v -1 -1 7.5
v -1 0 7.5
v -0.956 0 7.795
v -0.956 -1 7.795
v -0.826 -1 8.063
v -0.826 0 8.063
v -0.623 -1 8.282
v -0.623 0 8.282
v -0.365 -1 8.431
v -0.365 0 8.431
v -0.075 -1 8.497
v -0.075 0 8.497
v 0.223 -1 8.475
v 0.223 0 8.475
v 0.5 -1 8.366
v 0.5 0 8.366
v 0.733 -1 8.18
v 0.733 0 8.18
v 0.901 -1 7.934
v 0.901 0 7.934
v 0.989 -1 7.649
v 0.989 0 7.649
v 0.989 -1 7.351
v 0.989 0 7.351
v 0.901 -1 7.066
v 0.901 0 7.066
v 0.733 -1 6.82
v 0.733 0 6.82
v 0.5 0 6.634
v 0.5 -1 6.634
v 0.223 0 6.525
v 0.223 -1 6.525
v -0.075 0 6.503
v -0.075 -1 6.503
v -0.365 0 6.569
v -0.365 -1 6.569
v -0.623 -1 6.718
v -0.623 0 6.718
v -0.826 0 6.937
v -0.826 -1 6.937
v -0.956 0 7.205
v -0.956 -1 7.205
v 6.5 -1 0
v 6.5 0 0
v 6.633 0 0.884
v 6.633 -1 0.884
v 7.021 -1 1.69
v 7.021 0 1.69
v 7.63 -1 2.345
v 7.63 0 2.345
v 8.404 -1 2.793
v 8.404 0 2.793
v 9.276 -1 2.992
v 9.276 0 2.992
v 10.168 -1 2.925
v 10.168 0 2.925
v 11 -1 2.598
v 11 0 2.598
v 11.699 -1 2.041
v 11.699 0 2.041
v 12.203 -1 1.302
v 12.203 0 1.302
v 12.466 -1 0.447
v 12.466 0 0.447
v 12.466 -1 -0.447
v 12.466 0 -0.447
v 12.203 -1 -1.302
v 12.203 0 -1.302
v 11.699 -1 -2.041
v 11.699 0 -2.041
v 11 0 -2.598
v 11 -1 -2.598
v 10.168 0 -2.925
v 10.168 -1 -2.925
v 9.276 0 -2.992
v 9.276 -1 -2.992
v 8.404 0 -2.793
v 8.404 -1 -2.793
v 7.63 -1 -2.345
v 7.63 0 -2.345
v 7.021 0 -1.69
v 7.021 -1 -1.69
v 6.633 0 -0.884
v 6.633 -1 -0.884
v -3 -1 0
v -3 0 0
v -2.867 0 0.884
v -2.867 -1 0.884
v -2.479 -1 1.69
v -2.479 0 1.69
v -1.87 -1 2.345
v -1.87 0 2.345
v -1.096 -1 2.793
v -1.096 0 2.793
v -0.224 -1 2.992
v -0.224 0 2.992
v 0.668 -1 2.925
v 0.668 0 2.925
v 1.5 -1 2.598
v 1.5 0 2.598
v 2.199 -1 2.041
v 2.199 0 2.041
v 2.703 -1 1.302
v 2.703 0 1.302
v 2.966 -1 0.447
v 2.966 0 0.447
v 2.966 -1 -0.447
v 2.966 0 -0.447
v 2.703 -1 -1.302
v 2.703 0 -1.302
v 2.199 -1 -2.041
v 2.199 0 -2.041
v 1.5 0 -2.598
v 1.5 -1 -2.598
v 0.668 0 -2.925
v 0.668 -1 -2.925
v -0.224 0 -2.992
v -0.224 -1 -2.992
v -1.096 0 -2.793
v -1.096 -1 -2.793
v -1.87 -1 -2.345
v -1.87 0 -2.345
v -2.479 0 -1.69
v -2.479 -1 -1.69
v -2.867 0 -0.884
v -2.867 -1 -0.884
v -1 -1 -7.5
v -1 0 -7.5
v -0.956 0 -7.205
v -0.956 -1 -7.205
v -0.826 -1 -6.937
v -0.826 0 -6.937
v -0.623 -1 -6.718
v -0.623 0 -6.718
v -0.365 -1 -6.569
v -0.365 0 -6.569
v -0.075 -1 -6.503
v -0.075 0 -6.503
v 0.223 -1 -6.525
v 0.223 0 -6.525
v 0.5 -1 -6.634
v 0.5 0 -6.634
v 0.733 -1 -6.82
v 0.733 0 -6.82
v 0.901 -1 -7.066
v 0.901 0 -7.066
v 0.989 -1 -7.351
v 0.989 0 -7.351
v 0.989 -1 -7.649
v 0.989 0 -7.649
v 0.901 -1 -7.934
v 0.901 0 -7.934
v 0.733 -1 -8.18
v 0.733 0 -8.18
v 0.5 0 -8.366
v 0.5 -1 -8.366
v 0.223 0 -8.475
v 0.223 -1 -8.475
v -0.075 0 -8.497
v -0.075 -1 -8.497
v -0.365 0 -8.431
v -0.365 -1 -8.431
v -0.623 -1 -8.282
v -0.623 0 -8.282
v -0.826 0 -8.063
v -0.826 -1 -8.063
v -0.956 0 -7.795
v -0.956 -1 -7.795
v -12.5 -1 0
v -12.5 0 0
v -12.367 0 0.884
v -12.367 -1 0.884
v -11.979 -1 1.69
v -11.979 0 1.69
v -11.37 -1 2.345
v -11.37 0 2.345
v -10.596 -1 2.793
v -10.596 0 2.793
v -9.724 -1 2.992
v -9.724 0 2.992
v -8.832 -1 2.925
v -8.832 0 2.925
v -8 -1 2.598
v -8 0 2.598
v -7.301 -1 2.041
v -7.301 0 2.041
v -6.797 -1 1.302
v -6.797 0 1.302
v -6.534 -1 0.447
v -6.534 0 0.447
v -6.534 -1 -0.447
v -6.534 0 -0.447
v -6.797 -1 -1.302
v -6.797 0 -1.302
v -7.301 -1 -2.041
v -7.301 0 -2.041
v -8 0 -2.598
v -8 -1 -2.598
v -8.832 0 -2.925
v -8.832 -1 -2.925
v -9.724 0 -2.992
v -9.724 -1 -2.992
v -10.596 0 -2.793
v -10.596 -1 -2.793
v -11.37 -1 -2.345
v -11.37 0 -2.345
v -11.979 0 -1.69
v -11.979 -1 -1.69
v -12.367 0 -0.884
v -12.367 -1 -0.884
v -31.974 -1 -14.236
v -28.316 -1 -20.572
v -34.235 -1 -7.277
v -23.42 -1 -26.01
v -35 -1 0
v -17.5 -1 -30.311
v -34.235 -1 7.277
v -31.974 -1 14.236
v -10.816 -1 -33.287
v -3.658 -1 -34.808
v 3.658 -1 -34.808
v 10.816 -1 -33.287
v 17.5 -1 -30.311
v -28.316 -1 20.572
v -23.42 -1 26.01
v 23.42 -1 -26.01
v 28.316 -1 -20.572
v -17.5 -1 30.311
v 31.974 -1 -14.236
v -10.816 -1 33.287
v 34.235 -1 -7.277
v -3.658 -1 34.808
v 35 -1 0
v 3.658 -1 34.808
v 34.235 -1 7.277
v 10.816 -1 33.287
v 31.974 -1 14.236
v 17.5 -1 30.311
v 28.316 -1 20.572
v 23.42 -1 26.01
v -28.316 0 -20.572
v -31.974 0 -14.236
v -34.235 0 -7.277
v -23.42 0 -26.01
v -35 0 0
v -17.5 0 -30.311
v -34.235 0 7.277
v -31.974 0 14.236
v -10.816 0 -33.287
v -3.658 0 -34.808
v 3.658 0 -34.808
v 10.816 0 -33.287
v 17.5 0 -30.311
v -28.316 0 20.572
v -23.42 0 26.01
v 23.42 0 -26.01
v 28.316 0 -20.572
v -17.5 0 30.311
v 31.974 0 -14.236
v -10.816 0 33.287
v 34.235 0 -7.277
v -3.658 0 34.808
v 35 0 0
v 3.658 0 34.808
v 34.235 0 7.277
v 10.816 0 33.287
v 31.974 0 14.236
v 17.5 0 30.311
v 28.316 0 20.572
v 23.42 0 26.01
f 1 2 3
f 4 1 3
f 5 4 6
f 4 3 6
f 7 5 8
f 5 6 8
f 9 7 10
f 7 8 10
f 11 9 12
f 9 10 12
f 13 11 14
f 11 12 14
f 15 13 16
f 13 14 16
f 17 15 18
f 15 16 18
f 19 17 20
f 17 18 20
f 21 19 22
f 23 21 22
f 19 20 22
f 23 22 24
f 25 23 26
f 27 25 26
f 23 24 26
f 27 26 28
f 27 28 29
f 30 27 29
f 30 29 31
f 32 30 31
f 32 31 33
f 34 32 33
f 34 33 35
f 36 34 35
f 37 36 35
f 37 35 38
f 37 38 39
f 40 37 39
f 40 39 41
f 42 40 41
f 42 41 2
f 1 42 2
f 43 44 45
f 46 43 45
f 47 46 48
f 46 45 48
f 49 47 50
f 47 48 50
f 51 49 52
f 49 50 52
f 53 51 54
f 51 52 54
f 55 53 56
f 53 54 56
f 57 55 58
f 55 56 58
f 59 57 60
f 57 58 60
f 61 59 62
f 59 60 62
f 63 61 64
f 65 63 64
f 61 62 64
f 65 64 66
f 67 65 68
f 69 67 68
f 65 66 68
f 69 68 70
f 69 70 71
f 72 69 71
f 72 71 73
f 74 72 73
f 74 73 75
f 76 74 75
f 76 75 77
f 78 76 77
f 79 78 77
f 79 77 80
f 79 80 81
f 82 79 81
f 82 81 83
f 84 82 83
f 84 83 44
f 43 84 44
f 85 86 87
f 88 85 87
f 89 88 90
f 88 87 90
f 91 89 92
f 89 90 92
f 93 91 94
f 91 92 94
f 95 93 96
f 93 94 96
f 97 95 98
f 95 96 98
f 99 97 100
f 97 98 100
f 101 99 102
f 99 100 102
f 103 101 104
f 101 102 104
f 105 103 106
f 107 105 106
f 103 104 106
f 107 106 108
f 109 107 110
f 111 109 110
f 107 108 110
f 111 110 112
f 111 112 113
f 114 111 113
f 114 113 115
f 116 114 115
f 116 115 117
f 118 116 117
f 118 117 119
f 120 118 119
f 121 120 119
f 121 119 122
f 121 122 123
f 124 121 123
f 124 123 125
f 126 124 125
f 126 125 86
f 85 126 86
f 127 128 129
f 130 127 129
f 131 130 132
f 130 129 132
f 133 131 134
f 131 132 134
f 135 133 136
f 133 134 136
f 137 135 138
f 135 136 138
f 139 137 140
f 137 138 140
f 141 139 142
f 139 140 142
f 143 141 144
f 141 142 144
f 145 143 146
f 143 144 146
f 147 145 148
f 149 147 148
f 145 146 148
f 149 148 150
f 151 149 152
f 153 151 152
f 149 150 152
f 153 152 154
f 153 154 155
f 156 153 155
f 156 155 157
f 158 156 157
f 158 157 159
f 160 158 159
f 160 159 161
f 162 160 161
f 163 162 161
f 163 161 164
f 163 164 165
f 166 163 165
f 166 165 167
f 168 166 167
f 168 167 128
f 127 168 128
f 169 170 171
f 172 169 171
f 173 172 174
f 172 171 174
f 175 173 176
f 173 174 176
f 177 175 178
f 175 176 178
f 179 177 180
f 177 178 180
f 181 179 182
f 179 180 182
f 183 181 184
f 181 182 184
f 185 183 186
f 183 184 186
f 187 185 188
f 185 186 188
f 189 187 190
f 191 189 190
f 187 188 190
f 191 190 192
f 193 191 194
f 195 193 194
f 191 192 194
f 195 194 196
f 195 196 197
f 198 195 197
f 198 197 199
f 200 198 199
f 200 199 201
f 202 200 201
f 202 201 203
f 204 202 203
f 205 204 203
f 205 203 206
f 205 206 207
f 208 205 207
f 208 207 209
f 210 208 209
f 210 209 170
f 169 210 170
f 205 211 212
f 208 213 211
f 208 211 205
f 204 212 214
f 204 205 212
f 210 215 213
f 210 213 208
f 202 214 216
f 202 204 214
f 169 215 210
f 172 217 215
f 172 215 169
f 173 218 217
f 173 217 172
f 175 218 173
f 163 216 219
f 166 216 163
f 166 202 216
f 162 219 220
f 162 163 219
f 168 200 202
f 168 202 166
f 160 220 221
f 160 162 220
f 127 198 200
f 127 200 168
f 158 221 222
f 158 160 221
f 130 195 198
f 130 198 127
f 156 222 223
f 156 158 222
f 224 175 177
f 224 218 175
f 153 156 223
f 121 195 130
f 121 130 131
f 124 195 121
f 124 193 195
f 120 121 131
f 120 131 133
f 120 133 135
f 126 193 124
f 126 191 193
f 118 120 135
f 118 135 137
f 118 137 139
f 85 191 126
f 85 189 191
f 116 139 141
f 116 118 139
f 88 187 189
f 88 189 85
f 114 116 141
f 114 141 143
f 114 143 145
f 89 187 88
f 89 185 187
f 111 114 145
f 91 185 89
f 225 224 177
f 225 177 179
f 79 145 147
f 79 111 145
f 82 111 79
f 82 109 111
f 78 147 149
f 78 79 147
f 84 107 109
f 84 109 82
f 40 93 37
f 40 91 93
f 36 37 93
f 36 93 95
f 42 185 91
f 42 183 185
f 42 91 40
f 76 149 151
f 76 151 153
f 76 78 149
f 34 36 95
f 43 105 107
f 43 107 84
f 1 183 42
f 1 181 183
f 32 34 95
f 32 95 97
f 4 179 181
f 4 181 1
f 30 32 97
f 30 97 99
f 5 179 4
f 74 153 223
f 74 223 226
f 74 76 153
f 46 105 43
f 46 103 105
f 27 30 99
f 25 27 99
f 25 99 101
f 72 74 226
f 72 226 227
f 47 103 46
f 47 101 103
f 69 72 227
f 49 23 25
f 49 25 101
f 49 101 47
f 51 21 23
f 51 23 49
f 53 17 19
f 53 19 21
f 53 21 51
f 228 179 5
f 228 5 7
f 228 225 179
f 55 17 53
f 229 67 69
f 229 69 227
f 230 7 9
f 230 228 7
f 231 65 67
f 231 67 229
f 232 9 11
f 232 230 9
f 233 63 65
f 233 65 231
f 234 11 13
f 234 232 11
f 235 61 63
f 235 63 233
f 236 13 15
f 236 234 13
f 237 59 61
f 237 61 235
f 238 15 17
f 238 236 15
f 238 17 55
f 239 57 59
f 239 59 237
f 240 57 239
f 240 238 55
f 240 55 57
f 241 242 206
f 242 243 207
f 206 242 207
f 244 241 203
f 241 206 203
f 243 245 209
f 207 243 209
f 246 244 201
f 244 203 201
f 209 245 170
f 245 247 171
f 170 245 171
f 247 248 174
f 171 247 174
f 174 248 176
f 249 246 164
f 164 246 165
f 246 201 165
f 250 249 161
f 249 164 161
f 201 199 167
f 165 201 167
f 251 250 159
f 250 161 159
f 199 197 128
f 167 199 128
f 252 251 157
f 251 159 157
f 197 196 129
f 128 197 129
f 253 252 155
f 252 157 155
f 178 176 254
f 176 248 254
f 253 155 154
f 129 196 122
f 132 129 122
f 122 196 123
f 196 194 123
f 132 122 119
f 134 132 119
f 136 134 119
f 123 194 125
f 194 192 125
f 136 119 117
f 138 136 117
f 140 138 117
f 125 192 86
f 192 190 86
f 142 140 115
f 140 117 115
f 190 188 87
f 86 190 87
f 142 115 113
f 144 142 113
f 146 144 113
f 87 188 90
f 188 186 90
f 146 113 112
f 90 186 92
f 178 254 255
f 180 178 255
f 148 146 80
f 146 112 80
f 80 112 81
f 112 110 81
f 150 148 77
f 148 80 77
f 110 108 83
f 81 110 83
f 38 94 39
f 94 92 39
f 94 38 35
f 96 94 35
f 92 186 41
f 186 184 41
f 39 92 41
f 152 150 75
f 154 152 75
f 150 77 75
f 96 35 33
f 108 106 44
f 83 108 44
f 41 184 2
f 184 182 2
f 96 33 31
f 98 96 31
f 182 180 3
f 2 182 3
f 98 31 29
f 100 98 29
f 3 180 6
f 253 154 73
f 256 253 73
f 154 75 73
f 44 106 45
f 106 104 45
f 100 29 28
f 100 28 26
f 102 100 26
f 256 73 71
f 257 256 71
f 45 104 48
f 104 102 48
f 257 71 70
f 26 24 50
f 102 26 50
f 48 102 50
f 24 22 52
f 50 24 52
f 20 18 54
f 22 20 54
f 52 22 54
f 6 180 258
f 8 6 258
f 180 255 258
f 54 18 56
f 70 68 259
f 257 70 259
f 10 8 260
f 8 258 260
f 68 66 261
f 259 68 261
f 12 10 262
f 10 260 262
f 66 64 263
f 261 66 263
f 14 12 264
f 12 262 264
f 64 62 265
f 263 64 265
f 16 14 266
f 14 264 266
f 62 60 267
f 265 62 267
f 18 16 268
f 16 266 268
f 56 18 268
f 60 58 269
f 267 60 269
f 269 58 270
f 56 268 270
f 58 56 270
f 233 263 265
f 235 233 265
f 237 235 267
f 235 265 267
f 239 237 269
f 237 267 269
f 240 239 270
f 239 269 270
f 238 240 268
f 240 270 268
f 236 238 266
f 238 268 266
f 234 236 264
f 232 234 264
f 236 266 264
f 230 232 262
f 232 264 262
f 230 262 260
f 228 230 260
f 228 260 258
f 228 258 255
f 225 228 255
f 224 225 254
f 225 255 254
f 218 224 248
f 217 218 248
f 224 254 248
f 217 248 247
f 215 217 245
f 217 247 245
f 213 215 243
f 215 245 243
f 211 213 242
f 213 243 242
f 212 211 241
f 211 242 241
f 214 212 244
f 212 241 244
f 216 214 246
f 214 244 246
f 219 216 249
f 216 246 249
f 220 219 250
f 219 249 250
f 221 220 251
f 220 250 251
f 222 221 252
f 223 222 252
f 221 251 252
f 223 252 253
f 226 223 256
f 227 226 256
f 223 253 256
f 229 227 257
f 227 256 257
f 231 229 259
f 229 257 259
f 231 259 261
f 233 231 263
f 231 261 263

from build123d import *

# Parameters (mm, degrees)
F0_R     = 35
F1_DEPTH = 1
F4_D     = 6
F5_D     = 2


with BuildPart() as f1:
    # F0 (on Front) → F1 (new body)
    with BuildSketch(Plane.XZ):
        Circle(F0_R)
    extrude(amount=F1_DEPTH)

    # F4 (through all)
    with Locations(Plane.XZ.offset(4.318)):
        with Locations((-9.5, 0), (9.5, 0), (0, 0)):
            Hole(F4_D / 2)

    # F5 (through all)
    with Locations(Plane.XZ.offset(4.318)):
        with Locations((0, 7.5), (0, -7.5)):
            Hole(F5_D / 2)


solid = f1.part
